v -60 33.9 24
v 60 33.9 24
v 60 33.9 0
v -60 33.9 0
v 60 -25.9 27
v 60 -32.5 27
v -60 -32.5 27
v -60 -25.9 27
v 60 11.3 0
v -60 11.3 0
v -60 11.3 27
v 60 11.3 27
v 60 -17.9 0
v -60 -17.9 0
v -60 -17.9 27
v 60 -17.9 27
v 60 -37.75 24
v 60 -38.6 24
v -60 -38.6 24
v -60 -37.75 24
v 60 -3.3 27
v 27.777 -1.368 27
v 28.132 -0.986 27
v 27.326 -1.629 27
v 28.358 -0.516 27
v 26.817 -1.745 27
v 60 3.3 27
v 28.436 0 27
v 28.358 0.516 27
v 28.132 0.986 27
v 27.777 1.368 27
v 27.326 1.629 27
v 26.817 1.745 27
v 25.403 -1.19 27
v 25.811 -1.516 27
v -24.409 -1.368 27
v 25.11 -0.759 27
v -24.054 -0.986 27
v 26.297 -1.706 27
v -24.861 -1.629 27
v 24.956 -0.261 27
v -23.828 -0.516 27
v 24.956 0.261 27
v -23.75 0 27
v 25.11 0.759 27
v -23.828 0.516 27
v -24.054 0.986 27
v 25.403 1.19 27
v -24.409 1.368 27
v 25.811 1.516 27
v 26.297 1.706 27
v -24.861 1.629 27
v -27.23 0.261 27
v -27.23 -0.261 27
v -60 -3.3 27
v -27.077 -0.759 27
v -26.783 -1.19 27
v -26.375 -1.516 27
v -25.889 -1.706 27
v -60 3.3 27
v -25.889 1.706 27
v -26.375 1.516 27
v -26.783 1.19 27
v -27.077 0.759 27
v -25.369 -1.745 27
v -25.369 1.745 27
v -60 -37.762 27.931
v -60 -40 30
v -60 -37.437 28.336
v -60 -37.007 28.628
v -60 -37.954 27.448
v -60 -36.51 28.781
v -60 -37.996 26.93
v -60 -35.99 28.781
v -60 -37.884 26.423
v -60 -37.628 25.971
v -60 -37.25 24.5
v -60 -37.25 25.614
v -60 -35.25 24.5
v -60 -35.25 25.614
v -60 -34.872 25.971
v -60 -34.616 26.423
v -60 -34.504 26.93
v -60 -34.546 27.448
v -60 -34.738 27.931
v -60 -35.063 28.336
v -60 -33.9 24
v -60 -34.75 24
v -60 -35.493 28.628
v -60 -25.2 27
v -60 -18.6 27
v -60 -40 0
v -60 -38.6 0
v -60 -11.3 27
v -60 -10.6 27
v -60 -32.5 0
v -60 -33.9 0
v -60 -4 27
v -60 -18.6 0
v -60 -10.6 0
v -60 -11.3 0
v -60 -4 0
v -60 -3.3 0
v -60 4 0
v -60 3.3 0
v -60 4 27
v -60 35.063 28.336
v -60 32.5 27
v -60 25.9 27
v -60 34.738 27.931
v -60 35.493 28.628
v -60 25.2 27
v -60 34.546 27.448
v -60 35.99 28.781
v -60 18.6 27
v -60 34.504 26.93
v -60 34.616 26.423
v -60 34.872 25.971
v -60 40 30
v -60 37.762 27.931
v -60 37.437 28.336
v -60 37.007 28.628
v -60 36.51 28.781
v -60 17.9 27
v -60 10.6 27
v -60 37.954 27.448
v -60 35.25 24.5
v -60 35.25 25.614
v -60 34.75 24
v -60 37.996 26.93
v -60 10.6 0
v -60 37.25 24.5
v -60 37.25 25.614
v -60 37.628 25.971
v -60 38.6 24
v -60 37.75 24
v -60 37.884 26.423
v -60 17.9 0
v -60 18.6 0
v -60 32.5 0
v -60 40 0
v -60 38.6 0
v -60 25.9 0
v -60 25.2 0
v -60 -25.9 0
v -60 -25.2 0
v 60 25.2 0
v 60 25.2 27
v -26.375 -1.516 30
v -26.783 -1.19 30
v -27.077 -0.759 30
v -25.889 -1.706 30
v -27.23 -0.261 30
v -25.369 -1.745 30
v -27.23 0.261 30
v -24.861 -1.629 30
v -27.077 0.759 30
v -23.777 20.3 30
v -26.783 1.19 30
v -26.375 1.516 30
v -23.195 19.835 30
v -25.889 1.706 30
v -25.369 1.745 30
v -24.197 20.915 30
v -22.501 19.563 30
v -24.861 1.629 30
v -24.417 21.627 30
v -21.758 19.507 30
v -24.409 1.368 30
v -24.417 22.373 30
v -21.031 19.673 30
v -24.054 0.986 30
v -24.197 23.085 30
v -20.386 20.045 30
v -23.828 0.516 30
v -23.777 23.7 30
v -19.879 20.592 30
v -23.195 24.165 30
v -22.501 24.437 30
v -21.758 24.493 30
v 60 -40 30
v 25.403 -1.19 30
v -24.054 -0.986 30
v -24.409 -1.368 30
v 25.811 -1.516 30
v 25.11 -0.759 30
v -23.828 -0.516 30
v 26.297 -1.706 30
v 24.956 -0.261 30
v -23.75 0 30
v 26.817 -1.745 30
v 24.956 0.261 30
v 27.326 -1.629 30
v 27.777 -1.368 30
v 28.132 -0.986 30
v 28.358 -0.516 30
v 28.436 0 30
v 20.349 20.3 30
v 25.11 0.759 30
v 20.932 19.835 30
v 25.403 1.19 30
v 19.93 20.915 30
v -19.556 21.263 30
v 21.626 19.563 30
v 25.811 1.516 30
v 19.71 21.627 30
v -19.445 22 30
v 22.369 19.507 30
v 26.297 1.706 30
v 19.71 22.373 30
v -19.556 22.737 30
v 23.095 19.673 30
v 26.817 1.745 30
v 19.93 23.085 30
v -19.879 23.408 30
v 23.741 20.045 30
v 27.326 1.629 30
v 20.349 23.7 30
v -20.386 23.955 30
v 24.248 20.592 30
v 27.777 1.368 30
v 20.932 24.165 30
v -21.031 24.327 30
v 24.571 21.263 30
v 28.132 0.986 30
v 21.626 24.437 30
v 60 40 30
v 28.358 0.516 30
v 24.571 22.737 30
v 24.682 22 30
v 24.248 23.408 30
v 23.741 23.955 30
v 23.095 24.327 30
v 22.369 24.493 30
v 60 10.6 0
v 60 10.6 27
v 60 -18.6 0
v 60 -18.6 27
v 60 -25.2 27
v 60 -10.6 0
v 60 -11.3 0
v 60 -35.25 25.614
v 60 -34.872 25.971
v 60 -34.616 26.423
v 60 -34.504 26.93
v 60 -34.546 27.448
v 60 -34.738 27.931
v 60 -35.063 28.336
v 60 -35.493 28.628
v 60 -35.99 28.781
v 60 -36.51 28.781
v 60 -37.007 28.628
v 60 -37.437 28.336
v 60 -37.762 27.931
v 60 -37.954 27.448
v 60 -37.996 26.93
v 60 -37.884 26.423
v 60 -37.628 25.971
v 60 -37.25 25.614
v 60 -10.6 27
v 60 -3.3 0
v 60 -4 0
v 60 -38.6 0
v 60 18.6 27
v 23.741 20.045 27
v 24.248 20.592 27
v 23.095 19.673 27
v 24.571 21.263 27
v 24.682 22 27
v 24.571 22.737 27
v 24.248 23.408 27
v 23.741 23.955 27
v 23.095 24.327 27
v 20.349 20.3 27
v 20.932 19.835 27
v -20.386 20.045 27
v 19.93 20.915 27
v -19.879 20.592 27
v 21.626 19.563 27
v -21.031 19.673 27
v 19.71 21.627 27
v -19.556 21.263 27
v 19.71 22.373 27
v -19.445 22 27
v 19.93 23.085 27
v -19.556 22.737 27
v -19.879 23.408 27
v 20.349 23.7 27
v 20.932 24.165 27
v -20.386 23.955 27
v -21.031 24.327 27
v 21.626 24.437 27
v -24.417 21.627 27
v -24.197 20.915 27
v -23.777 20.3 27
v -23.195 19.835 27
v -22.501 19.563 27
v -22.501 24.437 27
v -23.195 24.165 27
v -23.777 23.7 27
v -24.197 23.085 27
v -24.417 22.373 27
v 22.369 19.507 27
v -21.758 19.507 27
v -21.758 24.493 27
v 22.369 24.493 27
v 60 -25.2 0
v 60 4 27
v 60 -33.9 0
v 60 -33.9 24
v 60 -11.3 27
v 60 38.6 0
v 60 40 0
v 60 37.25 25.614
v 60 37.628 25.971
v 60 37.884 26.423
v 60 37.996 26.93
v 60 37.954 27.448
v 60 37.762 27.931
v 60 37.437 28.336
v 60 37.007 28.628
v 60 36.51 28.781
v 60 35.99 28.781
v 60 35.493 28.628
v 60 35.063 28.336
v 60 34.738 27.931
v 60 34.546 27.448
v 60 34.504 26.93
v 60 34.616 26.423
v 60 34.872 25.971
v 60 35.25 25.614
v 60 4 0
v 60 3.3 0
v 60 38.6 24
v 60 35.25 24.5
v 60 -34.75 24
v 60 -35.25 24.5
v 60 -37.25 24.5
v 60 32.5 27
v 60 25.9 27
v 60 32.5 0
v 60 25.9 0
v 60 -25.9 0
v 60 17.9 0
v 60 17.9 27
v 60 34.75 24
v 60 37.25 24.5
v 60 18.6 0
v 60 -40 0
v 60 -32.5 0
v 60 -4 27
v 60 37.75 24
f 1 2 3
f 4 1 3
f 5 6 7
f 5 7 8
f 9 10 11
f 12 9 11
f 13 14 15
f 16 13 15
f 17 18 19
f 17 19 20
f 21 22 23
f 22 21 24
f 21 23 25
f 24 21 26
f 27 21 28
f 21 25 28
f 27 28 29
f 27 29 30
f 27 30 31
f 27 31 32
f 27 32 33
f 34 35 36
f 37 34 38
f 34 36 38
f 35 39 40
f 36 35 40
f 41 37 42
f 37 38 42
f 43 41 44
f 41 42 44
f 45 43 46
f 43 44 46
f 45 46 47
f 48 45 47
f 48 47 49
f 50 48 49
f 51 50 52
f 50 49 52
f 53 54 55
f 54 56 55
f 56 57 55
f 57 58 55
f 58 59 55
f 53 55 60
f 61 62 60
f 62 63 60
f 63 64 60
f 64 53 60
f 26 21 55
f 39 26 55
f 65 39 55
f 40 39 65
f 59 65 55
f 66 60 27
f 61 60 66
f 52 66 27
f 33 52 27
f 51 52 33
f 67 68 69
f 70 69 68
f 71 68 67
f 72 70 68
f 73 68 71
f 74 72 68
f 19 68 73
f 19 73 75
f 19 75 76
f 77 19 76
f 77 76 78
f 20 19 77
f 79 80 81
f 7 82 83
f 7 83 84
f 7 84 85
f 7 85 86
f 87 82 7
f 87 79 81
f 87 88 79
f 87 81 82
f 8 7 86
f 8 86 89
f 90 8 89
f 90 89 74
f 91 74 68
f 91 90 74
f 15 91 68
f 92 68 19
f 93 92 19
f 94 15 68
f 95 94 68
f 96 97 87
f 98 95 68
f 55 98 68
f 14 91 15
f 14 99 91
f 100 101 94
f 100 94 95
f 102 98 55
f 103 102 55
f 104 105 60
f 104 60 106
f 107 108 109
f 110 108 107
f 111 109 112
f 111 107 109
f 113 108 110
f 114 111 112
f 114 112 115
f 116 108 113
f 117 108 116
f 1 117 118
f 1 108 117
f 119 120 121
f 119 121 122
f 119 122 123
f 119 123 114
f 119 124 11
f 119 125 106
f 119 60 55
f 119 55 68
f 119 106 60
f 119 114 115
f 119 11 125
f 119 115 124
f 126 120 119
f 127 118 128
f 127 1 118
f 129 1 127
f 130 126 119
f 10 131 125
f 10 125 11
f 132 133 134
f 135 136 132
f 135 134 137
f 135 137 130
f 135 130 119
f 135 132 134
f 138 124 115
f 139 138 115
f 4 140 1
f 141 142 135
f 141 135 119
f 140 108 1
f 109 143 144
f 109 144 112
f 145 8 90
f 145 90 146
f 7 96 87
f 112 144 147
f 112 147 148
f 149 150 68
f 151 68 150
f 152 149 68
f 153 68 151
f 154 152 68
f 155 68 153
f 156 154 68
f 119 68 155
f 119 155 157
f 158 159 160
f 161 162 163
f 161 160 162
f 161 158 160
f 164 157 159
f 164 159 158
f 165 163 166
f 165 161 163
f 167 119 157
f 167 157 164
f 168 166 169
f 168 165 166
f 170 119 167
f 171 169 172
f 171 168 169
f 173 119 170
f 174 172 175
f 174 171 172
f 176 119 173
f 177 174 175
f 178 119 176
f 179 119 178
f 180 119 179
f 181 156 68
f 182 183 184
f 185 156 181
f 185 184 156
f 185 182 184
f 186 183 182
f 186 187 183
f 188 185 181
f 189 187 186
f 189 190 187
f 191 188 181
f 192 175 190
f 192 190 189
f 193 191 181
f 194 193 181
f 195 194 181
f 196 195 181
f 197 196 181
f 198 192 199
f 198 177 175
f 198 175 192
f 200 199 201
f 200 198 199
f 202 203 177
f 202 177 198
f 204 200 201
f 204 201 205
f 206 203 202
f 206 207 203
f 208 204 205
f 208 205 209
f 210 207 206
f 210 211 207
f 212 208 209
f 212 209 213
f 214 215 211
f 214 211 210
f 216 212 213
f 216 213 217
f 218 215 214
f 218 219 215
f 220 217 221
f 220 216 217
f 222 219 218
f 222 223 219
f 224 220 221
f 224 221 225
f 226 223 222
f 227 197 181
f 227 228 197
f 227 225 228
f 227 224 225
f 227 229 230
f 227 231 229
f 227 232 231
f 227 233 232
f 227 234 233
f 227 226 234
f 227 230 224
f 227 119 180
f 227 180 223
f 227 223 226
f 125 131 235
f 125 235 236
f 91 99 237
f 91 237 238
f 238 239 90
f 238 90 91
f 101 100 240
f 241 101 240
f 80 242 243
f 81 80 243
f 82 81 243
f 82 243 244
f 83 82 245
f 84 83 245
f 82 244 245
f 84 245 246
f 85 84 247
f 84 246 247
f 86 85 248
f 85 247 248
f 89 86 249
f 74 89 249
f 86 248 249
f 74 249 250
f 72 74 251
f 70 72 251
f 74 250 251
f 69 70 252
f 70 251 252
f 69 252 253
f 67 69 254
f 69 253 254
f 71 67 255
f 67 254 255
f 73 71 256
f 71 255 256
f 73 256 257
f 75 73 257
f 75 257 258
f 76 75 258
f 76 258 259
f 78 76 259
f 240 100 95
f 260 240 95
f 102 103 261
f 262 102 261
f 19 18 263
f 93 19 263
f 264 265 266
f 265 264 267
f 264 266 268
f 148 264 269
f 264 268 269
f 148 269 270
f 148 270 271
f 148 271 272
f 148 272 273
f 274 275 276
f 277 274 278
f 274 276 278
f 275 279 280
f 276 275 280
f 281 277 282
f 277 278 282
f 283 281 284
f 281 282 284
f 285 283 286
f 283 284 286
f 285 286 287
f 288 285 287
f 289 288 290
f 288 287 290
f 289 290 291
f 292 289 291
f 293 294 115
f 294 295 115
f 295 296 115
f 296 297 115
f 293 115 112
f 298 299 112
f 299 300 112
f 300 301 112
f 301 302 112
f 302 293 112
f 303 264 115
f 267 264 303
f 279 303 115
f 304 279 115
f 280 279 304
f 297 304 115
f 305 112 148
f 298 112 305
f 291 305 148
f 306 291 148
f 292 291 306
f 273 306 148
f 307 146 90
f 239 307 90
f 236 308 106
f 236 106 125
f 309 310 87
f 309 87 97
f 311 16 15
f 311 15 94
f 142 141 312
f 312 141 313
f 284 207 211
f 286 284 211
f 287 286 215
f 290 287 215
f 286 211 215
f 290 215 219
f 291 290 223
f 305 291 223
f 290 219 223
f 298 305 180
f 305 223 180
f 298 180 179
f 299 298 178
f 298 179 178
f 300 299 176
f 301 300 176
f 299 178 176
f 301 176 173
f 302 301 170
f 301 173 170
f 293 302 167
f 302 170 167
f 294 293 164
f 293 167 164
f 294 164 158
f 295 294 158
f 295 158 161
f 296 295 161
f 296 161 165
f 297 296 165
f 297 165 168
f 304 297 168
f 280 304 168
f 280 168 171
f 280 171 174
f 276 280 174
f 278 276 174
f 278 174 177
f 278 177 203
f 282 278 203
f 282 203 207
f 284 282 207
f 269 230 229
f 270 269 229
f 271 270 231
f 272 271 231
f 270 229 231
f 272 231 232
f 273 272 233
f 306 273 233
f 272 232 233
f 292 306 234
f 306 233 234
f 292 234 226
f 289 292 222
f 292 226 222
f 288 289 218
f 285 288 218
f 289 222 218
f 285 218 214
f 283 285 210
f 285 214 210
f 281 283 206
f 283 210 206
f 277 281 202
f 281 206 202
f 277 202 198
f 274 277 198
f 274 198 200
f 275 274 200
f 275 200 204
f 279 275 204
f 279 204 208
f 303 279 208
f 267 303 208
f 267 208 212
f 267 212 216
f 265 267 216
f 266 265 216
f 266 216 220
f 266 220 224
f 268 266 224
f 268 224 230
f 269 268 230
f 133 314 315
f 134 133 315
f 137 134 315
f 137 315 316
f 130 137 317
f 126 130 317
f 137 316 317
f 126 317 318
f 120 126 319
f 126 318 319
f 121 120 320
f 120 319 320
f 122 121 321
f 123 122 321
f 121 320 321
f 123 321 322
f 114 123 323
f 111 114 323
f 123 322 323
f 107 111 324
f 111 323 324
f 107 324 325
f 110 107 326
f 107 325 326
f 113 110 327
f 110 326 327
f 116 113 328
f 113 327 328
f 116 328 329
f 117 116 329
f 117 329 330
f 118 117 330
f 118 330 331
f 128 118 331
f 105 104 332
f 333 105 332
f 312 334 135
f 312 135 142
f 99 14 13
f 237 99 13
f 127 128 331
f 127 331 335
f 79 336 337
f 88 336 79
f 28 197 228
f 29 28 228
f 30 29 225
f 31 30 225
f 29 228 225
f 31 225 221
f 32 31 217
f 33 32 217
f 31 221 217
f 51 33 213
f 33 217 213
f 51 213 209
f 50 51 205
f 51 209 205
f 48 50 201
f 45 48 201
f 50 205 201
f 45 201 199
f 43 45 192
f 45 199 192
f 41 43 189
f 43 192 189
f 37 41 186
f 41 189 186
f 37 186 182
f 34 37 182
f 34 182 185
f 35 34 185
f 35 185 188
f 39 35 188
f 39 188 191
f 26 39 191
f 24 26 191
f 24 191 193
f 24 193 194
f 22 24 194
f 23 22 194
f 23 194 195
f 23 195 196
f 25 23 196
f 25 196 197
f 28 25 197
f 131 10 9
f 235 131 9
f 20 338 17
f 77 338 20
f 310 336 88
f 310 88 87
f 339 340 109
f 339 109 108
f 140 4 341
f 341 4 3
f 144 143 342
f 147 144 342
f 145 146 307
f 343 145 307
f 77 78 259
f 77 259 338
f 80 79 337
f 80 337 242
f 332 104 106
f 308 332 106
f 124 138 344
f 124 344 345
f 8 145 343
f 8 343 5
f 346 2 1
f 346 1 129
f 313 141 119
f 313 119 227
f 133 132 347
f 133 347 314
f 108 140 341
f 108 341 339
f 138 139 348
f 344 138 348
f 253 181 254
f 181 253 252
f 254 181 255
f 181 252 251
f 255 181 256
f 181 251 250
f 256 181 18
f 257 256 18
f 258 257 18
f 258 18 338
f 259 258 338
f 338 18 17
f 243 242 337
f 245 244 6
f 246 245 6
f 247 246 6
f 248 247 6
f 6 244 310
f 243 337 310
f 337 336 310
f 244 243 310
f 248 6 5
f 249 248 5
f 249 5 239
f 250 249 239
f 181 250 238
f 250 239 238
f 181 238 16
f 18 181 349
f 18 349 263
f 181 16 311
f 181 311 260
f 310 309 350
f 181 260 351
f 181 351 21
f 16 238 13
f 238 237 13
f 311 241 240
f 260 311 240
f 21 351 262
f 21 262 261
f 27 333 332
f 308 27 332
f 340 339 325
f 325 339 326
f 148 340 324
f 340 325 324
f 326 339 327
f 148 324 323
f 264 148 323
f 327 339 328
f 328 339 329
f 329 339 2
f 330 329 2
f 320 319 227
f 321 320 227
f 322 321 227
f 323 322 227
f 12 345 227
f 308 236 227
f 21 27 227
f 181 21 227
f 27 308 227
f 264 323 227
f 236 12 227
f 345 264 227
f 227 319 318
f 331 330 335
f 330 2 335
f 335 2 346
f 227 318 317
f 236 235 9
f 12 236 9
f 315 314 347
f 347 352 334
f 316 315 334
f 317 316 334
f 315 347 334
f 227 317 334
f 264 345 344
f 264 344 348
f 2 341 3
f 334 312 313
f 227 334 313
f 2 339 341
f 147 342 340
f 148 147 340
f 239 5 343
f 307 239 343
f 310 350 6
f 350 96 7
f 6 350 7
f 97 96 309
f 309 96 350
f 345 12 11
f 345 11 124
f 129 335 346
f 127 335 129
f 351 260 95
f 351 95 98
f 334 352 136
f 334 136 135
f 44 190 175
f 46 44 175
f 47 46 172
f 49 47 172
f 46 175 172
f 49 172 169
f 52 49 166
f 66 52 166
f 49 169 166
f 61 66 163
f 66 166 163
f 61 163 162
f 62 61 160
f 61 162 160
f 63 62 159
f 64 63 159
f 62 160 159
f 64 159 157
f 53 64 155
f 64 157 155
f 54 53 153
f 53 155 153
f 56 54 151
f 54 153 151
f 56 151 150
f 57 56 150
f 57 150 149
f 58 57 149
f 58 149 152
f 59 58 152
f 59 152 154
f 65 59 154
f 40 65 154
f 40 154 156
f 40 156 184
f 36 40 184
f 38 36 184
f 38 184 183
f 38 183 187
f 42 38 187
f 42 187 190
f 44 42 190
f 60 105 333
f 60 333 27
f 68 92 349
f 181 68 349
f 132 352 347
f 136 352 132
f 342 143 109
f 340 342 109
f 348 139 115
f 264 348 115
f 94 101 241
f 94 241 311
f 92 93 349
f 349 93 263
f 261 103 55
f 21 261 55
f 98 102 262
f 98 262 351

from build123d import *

# Parameters (mm, degrees)
SCHIZZO1_W                   = 120
SCHIZZO1_H                   = 80
ESTRUSIONE_ESTRUSIONE1_DEPTH = 30
SCHIZZO2_W                   = 27
SCHIZZO2_H                   = 6.6
TAGLIO_ESTRUSIONE1_DEPTH     = 121
RIPETIZIONE_A_L1_COUNT       = 9
RIPETIZIONE_A_L1_PITCH       = 7.3
SCHIZZO3_W                   = 24
SCHIZZO3_H                   = 4.7
TAGLIO_ESTRUSIONE2_DEPTH     = 121
TAGLIO_ESTRUSIONE3_DEPTH     = 121
SMUSSO1_SIZE                 = 0.5
SCHIZZO5_R                   = 1.75
SCHIZZO5_R_2                 = 2.5
TAGLIO_ESTRUSIONE4_DEPTH     = 10


with BuildPart() as part:
    # Schizzo1 → Estrusione-Estrusione1 (new body)
    with BuildSketch(Plane.XY):
        Rectangle(SCHIZZO1_W, SCHIZZO1_H)
    extrude(amount=ESTRUSIONE_ESTRUSIONE1_DEPTH)

    # Schizzo2 → Taglio-Estrusione1 (cut, through all)
    with BuildSketch(Plane.ZY.offset(60)):
        with Locations((13.5, -29.2)):
            Rectangle(SCHIZZO2_W, SCHIZZO2_H)
    taglio_estrusione1 = extrude(amount=-TAGLIO_ESTRUSIONE1_DEPTH, mode=Mode.SUBTRACT)

    # Ripetizione a L1: Taglio-Estrusione1 ×9
    with Locations(*[(0, i * RIPETIZIONE_A_L1_PITCH, 0) for i in range(1, RIPETIZIONE_A_L1_COUNT)]):
        add(taglio_estrusione1, mode=Mode.SUBTRACT)

    # Schizzo3 → Taglio-Estrusione2 (cut, through all)
    with BuildSketch(Plane(origin=(60, 0, 0), x_dir=(0, 0, -1), z_dir=(1, 0, 0))):
        with Locations((-12, -36.25)):
            Rectangle(SCHIZZO3_W, SCHIZZO3_H)
        with Locations((-12, 36.25)):
            Rectangle(SCHIZZO3_W, SCHIZZO3_H)
    extrude(amount=-TAGLIO_ESTRUSIONE2_DEPTH, mode=Mode.SUBTRACT)

    # Schizzo4 → Taglio-Estrusione3 (cut, through all)
    with BuildSketch(Plane(origin=(60, 0, 0), x_dir=(0, 0, -1), z_dir=(1, 0, 0))):
        with BuildLine():
            ThreePointArc((-25.3, 36.25), (-25.38030749, 35.725951413), (-25.613859338, 35.25))
            Line((-25.613859338, 35.25), (-24, 35.25))
            Line((-24, 35.25), (-24, 37.25))
            Line((-24, 37.25), (-25.613859338, 37.25))
            ThreePointArc((-25.613859338, 37.25), (-25.38030749, 36.774048587), (-25.3, 36.25))
        make_face()
        with BuildLine():
            Line((-27.05, 37.25), (-27.05, 35.25))
            Line((-27.05, 35.25), (-25.613859338, 35.25))
            ThreePointArc((-25.613859338, 35.25), (-25.38030749, 35.725951413), (-25.3, 36.25))
            ThreePointArc((-25.3, 36.25), (-25.38030749, 36.774048587), (-25.613859338, 37.25))
            Line((-25.613859338, 37.25), (-27.05, 37.25))
        make_face()
        with BuildLine():
            Line((-25.613859338, 35.25), (-27.05, 35.25))
            Line((-27.05, 35.25), (-27.05, 37.25))
            Line((-27.05, 37.25), (-25.613859338, 37.25))
            ThreePointArc((-25.613859338, 37.25), (-28.8, 36.25), (-25.613859338, 35.25))
        make_face()
        with BuildLine():
            ThreePointArc((-25.3, -36.25), (-25.38030749, -35.725951413), (-25.613859338, -35.25))
            Line((-25.613859338, -35.25), (-27.05, -35.25))
            Line((-27.05, -35.25), (-27.05, -37.25))
            Line((-27.05, -37.25), (-25.613859338, -37.25))
            ThreePointArc((-25.613859338, -37.25), (-25.38030749, -36.774048587), (-25.3, -36.25))
        make_face()
        with BuildLine():
            Line((-27.05, -35.25), (-25.613859338, -35.25))
            ThreePointArc((-25.613859338, -35.25), (-28.8, -36.25), (-25.613859338, -37.25))
            Line((-25.613859338, -37.25), (-27.05, -37.25))
            Line((-27.05, -37.25), (-27.05, -35.25))
        make_face()
        with BuildLine():
            Line((-24, -37.25), (-24, -35.25))
            Line((-24, -35.25), (-25.613859338, -35.25))
            ThreePointArc((-25.613859338, -35.25), (-25.38030749, -35.725951413), (-25.3, -36.25))
            ThreePointArc((-25.3, -36.25), (-25.38030749, -36.774048587), (-25.613859338, -37.25))
            Line((-25.613859338, -37.25), (-24, -37.25))
        make_face()
    extrude(amount=-TAGLIO_ESTRUSIONE3_DEPTH, mode=Mode.SUBTRACT)

    # Smusso1
    smusso1_edges = [part.edges().sort_by_distance(p)[0] for p in [
        (0, 37.25, 24),
        (0, 35.25, 24),
        (0, -35.25, 24),
        (0, -37.25, 24),
    ]]
    chamfer(smusso1_edges, length=SMUSSO1_SIZE)

    # Schizzo5 → Taglio-Estrusione4 (cut)
    with BuildSketch(Plane.XY.offset(30)):
        with Locations((-25.5, 0)):
            Circle(SCHIZZO5_R)
        with Locations((26.686198964, 0)):
            Circle(SCHIZZO5_R)
        with Locations((-21.944553743, 22)):
            Circle(SCHIZZO5_R_2)
        with Locations((22.18196976, 22)):
            Circle(SCHIZZO5_R_2)
    extrude(amount=-TAGLIO_ESTRUSIONE4_DEPTH, mode=Mode.SUBTRACT)


solid = part.part
